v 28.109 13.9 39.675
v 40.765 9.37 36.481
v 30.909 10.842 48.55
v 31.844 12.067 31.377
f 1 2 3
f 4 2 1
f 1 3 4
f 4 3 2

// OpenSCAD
// Auto-generated auxetic polyhedron
points = [
    [30.909100, 10.841928, 48.549739],
    [40.765239, 9.369752, 36.481113],
    [28.109148, 13.900190, 39.674980],
    [31.843704, 12.066575, 31.377149],
];

faces = [
    [0, 1, 2],
    [2, 1, 3],
    [3, 0, 2],
    [1, 0, 3],
];

polyhedron(points = points, faces = faces);
